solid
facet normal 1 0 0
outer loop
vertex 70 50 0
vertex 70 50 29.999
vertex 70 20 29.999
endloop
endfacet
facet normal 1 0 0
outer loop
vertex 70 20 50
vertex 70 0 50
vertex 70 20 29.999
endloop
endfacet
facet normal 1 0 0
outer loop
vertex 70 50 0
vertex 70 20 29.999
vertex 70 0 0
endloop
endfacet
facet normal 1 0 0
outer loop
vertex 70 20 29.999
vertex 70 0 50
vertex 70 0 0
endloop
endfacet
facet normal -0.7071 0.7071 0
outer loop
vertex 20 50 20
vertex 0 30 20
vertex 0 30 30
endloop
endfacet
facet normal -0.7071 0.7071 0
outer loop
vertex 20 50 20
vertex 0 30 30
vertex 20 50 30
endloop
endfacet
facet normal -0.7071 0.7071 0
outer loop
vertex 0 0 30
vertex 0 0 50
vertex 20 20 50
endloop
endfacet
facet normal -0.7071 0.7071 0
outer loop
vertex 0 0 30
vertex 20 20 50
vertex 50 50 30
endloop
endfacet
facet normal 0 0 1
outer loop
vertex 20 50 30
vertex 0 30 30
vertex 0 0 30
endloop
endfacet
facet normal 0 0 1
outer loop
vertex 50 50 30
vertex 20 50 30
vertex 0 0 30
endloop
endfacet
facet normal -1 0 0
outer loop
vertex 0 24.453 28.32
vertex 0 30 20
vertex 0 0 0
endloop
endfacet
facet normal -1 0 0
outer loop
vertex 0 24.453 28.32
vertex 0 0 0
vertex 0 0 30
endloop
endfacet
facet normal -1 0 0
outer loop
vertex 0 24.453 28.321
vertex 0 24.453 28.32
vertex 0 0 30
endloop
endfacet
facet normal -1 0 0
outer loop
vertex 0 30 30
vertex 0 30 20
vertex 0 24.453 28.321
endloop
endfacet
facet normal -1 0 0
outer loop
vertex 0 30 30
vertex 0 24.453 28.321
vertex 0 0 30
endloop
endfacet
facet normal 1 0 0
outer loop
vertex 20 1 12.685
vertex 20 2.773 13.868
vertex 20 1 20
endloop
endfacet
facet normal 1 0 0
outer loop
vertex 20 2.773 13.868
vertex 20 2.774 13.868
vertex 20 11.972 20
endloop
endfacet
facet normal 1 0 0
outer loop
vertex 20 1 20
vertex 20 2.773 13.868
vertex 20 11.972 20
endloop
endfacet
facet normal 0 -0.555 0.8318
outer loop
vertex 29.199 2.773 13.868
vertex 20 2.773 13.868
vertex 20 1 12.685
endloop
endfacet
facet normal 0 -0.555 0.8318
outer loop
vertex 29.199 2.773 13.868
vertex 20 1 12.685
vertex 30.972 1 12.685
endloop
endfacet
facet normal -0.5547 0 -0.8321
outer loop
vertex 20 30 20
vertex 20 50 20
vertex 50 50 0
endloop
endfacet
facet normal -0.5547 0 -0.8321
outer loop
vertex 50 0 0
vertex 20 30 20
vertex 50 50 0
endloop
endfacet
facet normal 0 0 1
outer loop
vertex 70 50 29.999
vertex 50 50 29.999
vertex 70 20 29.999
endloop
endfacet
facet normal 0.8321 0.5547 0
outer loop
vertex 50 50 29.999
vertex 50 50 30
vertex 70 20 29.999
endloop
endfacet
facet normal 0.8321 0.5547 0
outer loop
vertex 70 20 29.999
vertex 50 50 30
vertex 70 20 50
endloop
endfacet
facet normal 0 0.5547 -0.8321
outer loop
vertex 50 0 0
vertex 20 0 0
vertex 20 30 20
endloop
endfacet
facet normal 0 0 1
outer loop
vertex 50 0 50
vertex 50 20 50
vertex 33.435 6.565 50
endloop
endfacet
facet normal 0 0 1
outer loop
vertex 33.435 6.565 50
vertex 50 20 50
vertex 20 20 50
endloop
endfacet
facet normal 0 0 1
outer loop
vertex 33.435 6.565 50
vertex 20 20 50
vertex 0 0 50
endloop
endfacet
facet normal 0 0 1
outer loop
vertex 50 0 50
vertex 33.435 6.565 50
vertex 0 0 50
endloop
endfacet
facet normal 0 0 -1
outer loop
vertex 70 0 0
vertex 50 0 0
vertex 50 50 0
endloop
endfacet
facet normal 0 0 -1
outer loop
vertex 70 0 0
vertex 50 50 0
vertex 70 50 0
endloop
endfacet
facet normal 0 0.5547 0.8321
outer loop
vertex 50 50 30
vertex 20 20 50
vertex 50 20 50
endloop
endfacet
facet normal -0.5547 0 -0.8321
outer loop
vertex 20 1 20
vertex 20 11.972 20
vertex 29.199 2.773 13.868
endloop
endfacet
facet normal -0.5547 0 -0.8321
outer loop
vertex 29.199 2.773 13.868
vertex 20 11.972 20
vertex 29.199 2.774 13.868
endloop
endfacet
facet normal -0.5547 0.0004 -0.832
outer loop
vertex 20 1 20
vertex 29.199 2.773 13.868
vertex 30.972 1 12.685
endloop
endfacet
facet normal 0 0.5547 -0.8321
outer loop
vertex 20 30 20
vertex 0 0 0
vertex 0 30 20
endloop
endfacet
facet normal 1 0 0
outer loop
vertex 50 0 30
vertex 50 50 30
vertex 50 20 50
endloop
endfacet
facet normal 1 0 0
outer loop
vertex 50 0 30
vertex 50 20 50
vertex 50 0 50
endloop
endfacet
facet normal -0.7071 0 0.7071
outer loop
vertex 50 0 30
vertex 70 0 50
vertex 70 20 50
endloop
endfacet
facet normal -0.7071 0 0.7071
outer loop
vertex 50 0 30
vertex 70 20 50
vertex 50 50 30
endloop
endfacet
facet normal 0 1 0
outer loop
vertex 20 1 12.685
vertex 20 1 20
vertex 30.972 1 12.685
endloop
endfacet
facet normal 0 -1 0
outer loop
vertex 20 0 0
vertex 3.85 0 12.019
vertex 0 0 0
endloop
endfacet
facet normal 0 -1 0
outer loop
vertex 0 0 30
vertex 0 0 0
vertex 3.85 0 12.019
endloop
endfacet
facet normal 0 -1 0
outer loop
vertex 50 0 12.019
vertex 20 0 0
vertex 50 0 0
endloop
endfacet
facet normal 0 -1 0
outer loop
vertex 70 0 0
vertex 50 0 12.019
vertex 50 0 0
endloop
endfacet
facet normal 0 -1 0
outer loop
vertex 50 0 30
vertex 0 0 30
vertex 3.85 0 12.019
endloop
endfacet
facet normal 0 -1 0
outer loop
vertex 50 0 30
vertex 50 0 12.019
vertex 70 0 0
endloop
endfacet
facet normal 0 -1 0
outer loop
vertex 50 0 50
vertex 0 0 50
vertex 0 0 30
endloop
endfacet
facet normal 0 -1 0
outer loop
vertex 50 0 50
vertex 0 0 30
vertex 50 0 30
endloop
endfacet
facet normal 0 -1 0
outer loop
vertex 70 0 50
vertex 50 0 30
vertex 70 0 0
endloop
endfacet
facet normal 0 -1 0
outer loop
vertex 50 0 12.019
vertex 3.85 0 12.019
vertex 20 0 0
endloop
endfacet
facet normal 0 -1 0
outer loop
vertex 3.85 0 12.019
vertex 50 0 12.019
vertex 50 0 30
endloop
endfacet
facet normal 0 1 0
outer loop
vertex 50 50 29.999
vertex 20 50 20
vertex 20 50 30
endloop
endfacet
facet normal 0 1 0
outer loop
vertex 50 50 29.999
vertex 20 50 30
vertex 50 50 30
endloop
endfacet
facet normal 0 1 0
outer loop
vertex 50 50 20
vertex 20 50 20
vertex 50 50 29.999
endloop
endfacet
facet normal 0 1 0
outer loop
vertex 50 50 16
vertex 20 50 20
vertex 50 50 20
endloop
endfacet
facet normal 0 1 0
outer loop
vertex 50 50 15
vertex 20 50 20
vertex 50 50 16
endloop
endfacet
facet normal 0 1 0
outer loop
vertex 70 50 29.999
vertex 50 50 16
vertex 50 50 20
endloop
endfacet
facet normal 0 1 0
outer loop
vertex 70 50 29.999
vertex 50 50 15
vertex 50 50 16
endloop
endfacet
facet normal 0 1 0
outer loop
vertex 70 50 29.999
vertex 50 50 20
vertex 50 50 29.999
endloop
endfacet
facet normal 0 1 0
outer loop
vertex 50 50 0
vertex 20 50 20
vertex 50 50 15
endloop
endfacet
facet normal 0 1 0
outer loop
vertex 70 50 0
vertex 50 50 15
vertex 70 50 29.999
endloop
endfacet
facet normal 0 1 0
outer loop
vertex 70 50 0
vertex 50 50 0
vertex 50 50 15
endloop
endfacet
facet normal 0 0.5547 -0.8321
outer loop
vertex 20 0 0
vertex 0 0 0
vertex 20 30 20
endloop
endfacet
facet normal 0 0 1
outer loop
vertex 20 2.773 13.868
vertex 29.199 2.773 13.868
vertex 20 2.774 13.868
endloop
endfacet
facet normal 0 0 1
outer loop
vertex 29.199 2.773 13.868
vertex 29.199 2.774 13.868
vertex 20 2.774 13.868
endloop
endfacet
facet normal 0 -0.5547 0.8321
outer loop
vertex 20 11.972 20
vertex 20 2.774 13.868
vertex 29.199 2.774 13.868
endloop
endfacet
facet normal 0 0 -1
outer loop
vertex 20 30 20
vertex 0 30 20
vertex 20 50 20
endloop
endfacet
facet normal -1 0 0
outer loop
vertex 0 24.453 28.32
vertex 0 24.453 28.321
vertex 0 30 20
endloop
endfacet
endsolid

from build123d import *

# Parameters (mm, degrees)
BOSS_EXTRUDE1_DEPTH  = 50
CUT_EXTRUDE2_DEPTH   = 10
CUT_EXTRUDE3_DEPTH   = 20
SKETCH4_W            = 20
SKETCH4_H            = 50
CUT_EXTRUDE4_DEPTH   = 10
CUT_EXTRUDE5_DEPTH   = 10
CUT_EXTRUDE6_DEPTH   = 20
SKETCH7_W            = 10
SKETCH7_H            = 20
CUT_EXTRUDE7_DEPTH   = 30
BOSS_EXTRUDE2_DEPTH  = 30
CUT_EXTRUDE10_DEPTH  = 72
CUT_EXTRUDE13_DEPTH  = 10
BOSS_EXTRUDE3_DEPTH  = 10
BOSS_EXTRUDE4_DEPTH  = 29
BOSS_EXTRUDE5_DEPTH  = 29
CUT_EXTRUDE15_DEPTH  = 29
CUT_EXTRUDE17_DEPTH  = 10
BOSS_EXTRUDE6_DEPTH  = 35
CUT_EXTRUDE21_DEPTH  = 10
CUT_EXTRUDE23_DEPTH  = 10
CUT_EXTRUDE24_DEPTH  = 10
CUT_EXTRUDE25_DEPTH  = 10
BOSS_EXTRUDE13_DEPTH = 19
BOSS_EXTRUDE14_DEPTH = 19
BOSS_EXTRUDE15_DEPTH = 19
CUT_EXTRUDE27_DEPTH  = 19
CUT_EXTRUDE28_DEPTH  = 10
BOSS_EXTRUDE16_DEPTH = 35
BOSS_EXTRUDE17_DEPTH = 29
CUT_EXTRUDE29_DEPTH  = 108
BOSS_EXTRUDE18_DEPTH = 30
CUT_EXTRUDE30_DEPTH  = 10
CUT_EXTRUDE31_DEPTH  = 20
CUT_EXTRUDE34_DEPTH  = 10
CUT_EXTRUDE35_DEPTH  = 10
SKETCH51_W           = 10
SKETCH51_H           = 20
BOSS_EXTRUDE20_DEPTH = 10
BOSS_EXTRUDE21_DEPTH = 10
BOSS_EXTRUDE23_DEPTH = 50
CUT_EXTRUDE36_DEPTH  = 50
SKETCH55_W           = 20
SKETCH55_H           = 9.999
CUT_EXTRUDE41_DEPTH  = 50
SKETCH57_W           = 20
SKETCH57_H           = 9.999
BOSS_EXTRUDE24_DEPTH = 30
CUT_EXTRUDE45_DEPTH  = 10
CUT_EXTRUDE46_DEPTH  = 40
BOSS_EXTRUDE25_DEPTH = 0.0001
BOSS_EXTRUDE28_DEPTH = 10
EXTRUDE_THIN1_DEPTH  = 10
BOSS_EXTRUDE30_DEPTH = 10
CUT_EXTRUDE48_DEPTH  = 10
CUT_EXTRUDE50_DEPTH  = 10
SKETCH68_W           = 25.723933528
SKETCH68_H           = 25.413889584
BOSS_EXTRUDE39_DEPTH = 1


with BuildPart() as part:
    # Sketch1 → Boss-Extrude1 (new body)
    with BuildSketch(Plane.XY):
        Polygon((0, 0), (0, 30), (20, 50), (70, 50), (70, 0), align=None)
    extrude(amount=BOSS_EXTRUDE1_DEPTH)

    # Sketch2 → Cut-Extrude2 (cut)
    with BuildSketch(Plane.XY.offset(50)):
        Polygon((0, 30), (0, 0), (50, 50), (20, 50), align=None)
    extrude(amount=-CUT_EXTRUDE2_DEPTH, mode=Mode.SUBTRACT)

    # Sketch3 → Cut-Extrude3 (cut)
    with BuildSketch(Plane.XY.offset(50)):
        Polygon((50, 20), (20, 20), (0, 0), (50, 0), align=None)
    extrude(amount=-CUT_EXTRUDE3_DEPTH, mode=Mode.SUBTRACT)

    # Sketch4 → Cut-Extrude4 (cut)
    with BuildSketch(Plane.XY.offset(50)):
        with Locations((60, 25)):
            Rectangle(SKETCH4_W, SKETCH4_H)
    extrude(amount=-CUT_EXTRUDE4_DEPTH, mode=Mode.SUBTRACT)

    # Sketch5 → Cut-Extrude5 (cut)
    with BuildSketch(Plane.XY.offset(40)):
        Polygon((50, 50), (70, 20), (70, 50), align=None)
    extrude(amount=-CUT_EXTRUDE5_DEPTH, mode=Mode.SUBTRACT)

    # Sketch6 → Cut-Extrude6 (cut)
    with BuildSketch(Plane.ZY):
        Polygon((0, 0), (20, 30), (20, 50), (0, 50), align=None)
    extrude(amount=-CUT_EXTRUDE6_DEPTH, mode=Mode.SUBTRACT)

    # Sketch7 → Cut-Extrude7 (cut)
    with BuildSketch(Plane.ZY):
        with Locations((25, 40)):
            Rectangle(SKETCH7_W, SKETCH7_H)
    extrude(amount=-CUT_EXTRUDE7_DEPTH, mode=Mode.SUBTRACT)

    # Sketch8 → Boss-Extrude2 (add)
    with BuildSketch(Plane.ZY):
        Polygon((30, 50), (30, 0), (50, 0), (50, 20), align=None)
    extrude(amount=-BOSS_EXTRUDE2_DEPTH)

    # Sketch10 → Cut-Extrude10 (cut)
    with BuildSketch(Plane.ZY):
        Polygon((30, 50), (50, 20), (50, 50), align=None)
    extrude(amount=-CUT_EXTRUDE10_DEPTH, mode=Mode.SUBTRACT)

    # Sketch11 → Cut-Extrude13 (cut)
    with BuildSketch(Plane(origin=(0, 0, 0), x_dir=(0, 0, -1), z_dir=(1, 0, 0))):
        Polygon((-30, 50), (-30, 0), (-50, 0), (-50, 20), align=None)
    extrude(amount=CUT_EXTRUDE13_DEPTH, mode=Mode.SUBTRACT)

    # Sketch12 → Boss-Extrude3 (add)
    with BuildSketch(Plane(origin=(0, 29.230769231, 43.846153846), x_dir=(1, 0, 0), z_dir=(0, 0.5547001962252294, 0.8320502943378435))):
        Polygon((30, 6.933752453), (35, 6.933752453), (30, 0.924500327), align=None)
    extrude(amount=-BOSS_EXTRUDE3_DEPTH)

    # Sketch14 → Boss-Extrude4 (add)
    with BuildSketch(Plane.XY.offset(50)):
        Polygon((50, 0), (70, 0), (70, 20), (50, 50), align=None)
    extrude(amount=-BOSS_EXTRUDE4_DEPTH)

    # Sketch15 → Boss-Extrude5 (add)
    with BuildSketch(Plane.XY.offset(50)):
        Polygon((50, 0), (0, 0), (20, 20), (50, 20), align=None)
    extrude(amount=-BOSS_EXTRUDE5_DEPTH)

    # Sketch16 → Cut-Extrude15 (cut)
    with BuildSketch(Plane.XY.offset(50)):
        Polygon((10, 10), (20, 20), (10, 20), align=None)
    extrude(amount=-CUT_EXTRUDE15_DEPTH, mode=Mode.SUBTRACT)

    # Sketch17 → Cut-Extrude17 (cut)
    with BuildSketch(Plane.XY.offset(50)):
        Polygon((50, 20), (50, 0), (70, 0), (70, 20), (50, 50), align=None)
    extrude(amount=-CUT_EXTRUDE17_DEPTH, mode=Mode.SUBTRACT)

    # Sketch18 → Boss-Extrude6 (add)
    with BuildSketch(Plane.XY.offset(50)):
        Polygon((50, 20), (50, 50), (20, 20), align=None)
    extrude(amount=-BOSS_EXTRUDE6_DEPTH)

    # Sketch20 → Cut-Extrude21 (cut)
    with BuildSketch(Plane(origin=(0, 29.230769231, 43.846153846), x_dir=(1, 0, 0), z_dir=(0, 0.5547001962252294, 0.8320502943378435))):
        Polygon((20, -11.094003925), (50, 24.96150883), (10, 24.96150883), (10, -11.094003925), align=None)
    extrude(amount=-CUT_EXTRUDE21_DEPTH, mode=Mode.SUBTRACT)

    # Sketch26 → Cut-Extrude23 (cut)
    with BuildSketch(Plane.XY.offset(50)):
        Polygon((50, 50), (50, 20), (20, 20), align=None)
    extrude(amount=-CUT_EXTRUDE23_DEPTH, mode=Mode.SUBTRACT)

    # Sketch28 → Cut-Extrude24 (cut)
    with BuildSketch(Plane.XY.offset(40)):
        Polygon((50, 20), (50, 50), (24.615384615, 20), align=None)
    extrude(amount=-CUT_EXTRUDE24_DEPTH, mode=Mode.SUBTRACT)


with BuildPart() as cut_extrude24_piece_1:
    # of the separate pieces the step leaves, piece 1, a body of its own (cut_extrude24_pieces)
    add(part.part.solids().sort_by_distance((0, 0, 0))[0])

    # Sketch32 → Boss-Extrude13 (add)
    with BuildSketch(Plane.XY.offset(35)):
        Polygon((20, 20), (50, 20), (50, 50), align=None)
    extrude(amount=-BOSS_EXTRUDE13_DEPTH)

    # Sketch33 → Boss-Extrude14 (add)
    with BuildSketch(Plane(origin=(0, 0, 0), x_dir=(0, 0, 1), z_dir=(-0.7071067811865476, 0.7071067811865475, 0))):
        Polygon((41.679497057, 20.439625842), (37.981495748, 28.284271247), (50, 28.284271247), align=None)
    extrude(amount=-BOSS_EXTRUDE14_DEPTH)

    # Sketch34 → Boss-Extrude15 (add)
    with BuildSketch(Plane(origin=(0, 20, 0), x_dir=(1, 0, 0), z_dir=(0, 1, 0))):
        Polygon((25.547001962, -37.981495748), (20, -37.981495748), (20, -50), align=None)
    extrude(amount=-BOSS_EXTRUDE15_DEPTH)

    # Sketch36 → Cut-Extrude27 (cut)
    with BuildSketch(Plane.XY.offset(35)):
        Polygon((28.399590758, 24.472243623), (24.615384615, 20), (8.952966546, 20), (8.952966546, 24.472243623), align=None)
    extrude(amount=CUT_EXTRUDE27_DEPTH, mode=Mode.SUBTRACT)

    # Sketch37 → Cut-Extrude28 (cut)
    with BuildSketch(Plane.XY.offset(35)):
        Polygon((24.472243623, 24.472243623), (20, 20), (10, 20), (10, 24.472243623), align=None)
    extrude(amount=-CUT_EXTRUDE28_DEPTH, mode=Mode.SUBTRACT)

    # Sketch39 → Boss-Extrude16 (add)
    with BuildSketch(Plane.ZY.offset(-30)):
        Polygon((30, 31.972243623), (30, 50), (21.679497057, 44.452998038), align=None)
    extrude(amount=-BOSS_EXTRUDE16_DEPTH)

    # Sketch41 → Boss-Extrude17 (add)
    with BuildSketch(Plane(origin=(20, 0, 0), x_dir=(0, 0, -1), z_dir=(1, 0, 0))):
        Polygon((-30, 0), (-50, 0), (-50, 20), (-30, 50), align=None)
    extrude(amount=BOSS_EXTRUDE17_DEPTH)

    # Sketch42 → Cut-Extrude29 (cut)
    with BuildSketch(Plane.ZY):
        Polygon((50, 50), (50, 20), (30, 50), align=None)
    extrude(amount=-CUT_EXTRUDE29_DEPTH, mode=Mode.SUBTRACT)

    # Sketch43 → Boss-Extrude18 (add)
    with BuildSketch(Plane.ZY.offset(-20)):
        Polygon((30, 50), (30, 20), (50, 20), align=None)
    extrude(amount=-BOSS_EXTRUDE18_DEPTH)

    # Sketch44 → Cut-Extrude30 (cut)
    with BuildSketch(Plane.ZY.offset(-10)):
        Polygon((30, 24.472243623), (30, 31.972243623), (35, 24.472243623), align=None)
    extrude(amount=-CUT_EXTRUDE30_DEPTH, mode=Mode.SUBTRACT)

    # Sketch45 → Cut-Extrude31 (cut)
    with BuildSketch(Plane.XY.offset(50)):
        Polygon((20, 20), (50, 50), (20, 50), align=None)
    extrude(amount=-CUT_EXTRUDE31_DEPTH, mode=Mode.SUBTRACT)

    # Sketch48 → Cut-Extrude34 (cut)
    with BuildSketch(Plane.XY.offset(40)):
        Polygon((70, 0), (70, 20), (60, 35), (50, 35), (50, 0), align=None)
        Polygon((50, 50), (50, 35), (60, 35), align=None)
    extrude(amount=-CUT_EXTRUDE34_DEPTH, mode=Mode.SUBTRACT)

    # Sketch49 → Cut-Extrude35 (cut)
    with BuildSketch(Plane.XY.offset(30)):
        Polygon((50, 50), (70, 20), (70, 50), align=None)
    extrude(amount=-CUT_EXTRUDE35_DEPTH, mode=Mode.SUBTRACT)

    # Sketch51 → Boss-Extrude20 (add)
    with BuildSketch(Plane.XY.offset(20)):
        with Locations((25, 40)):
            Rectangle(SKETCH51_W, SKETCH51_H)
        Polygon((20, 30), (0, 30), (20, 50), align=None)
    extrude(amount=BOSS_EXTRUDE20_DEPTH)

    # Sketch52 → Boss-Extrude21 (add)
    with BuildSketch(Plane.XY.offset(30)):
        Polygon((10, 10), (24.472243623, 24.472243623), (10, 24.472243623), align=None)
    extrude(amount=-BOSS_EXTRUDE21_DEPTH)

    # Sketch53 → Boss-Extrude23 (add)
    with BuildSketch(Plane(origin=(0, 0, 0), x_dir=(1, 0, 0), z_dir=(0, 1, 0))):
        Polygon((70, -30), (70, -50), (50, -30), align=None)
    extrude(amount=BOSS_EXTRUDE23_DEPTH)

    # Sketch54 → Cut-Extrude36 (cut)
    with BuildSketch(Plane(origin=(0, 0, 30), x_dir=(-1, 0, 0), z_dir=(0, 0, -1))):
        Polygon((-70, 20), (-50, 50), (-70, 50), align=None)
    extrude(amount=-CUT_EXTRUDE36_DEPTH, mode=Mode.SUBTRACT)

    # Sketch55 → Cut-Extrude41 (cut)
    with BuildSketch(Plane(origin=(0, 20, 0), x_dir=(1, 0, 0), z_dir=(0, 1, 0))):
        with Locations((60, -24.9995)):
            Rectangle(SKETCH55_W, SKETCH55_H)
    extrude(amount=CUT_EXTRUDE41_DEPTH, mode=Mode.SUBTRACT)

    # Sketch57 → Boss-Extrude24 (add)
    with BuildSketch(Plane(origin=(0, 20, 0), x_dir=(1, 0, 0), z_dir=(0, 1, 0))):
        with Locations((60, -24.9995)):
            Rectangle(SKETCH57_W, SKETCH57_H)
    extrude(amount=BOSS_EXTRUDE24_DEPTH)

    # Sketch58 → Cut-Extrude45 (cut)
    with BuildSketch(Plane(origin=(0, 50, 0), x_dir=(1, 0, 0), z_dir=(0, 1, 0))):
        Polygon((20, -20), (50, 0), (20, 0), align=None)
    extrude(amount=-CUT_EXTRUDE45_DEPTH, mode=Mode.SUBTRACT)

    # Sketch59 → Cut-Extrude46 (cut)
    with BuildSketch(Plane(origin=(0, 40, 0), x_dir=(1, 0, 0), z_dir=(0, 1, 0))):
        Polygon((20, 0), (20, -20), (50, 0), align=None)
    extrude(amount=-CUT_EXTRUDE46_DEPTH, mode=Mode.SUBTRACT)

    # Sketch60 → Boss-Extrude25 (add)
    with BuildSketch(Plane.XZ):
        Polygon((20, 0), (50, 0), (20, 20), align=None)
    extrude(amount=-BOSS_EXTRUDE25_DEPTH)

    # Sketch61 → Boss-Extrude28 (add)
    with BuildSketch(Plane(origin=(0, 3.0769e-05, -4.6154e-05), x_dir=(1, 0, 0), z_dir=(0, -0.5547014763049025, 0.8320494409499725))):
        Polygon((50, 8.3205e-05), (20, 36.055512755), (20, 8.3205e-05), align=None)
    extrude(amount=BOSS_EXTRUDE28_DEPTH)

    # Sketch62 → Extrude-Thin1 (add)
    with BuildSketch(Plane(origin=(0, 0, 0), x_dir=(-0.9999999999968847, 1.384610769127148e-06, -2.0769161536907223e-06), z_dir=(2.496142562323782e-06, 0.5547001962235016, -0.8320502943352512))):
        Polygon((0, 36.055512755), (-4.722952829, 0), (-50, 8.3205e-05), (-49.999981623, 10.000083205), (-13.498467783, 10.000016127), (-9.915295125, 37.354328597), align=None)
    extrude(amount=-EXTRUDE_THIN1_DEPTH)

    # Sketch63 → Boss-Extrude30 (add)
    with BuildSketch(Plane(origin=(0, 0, 0), x_dir=(-0.9999999999993847, -6.153857514652135e-07, 9.230773964263176e-07), z_dir=(-1.109401416485302e-06, 0.5547007082562057, -0.8320499529828923))):
        Polygon((-20, 36.055512755), (0, 0), (-50, 8.3205e-05), align=None)
    extrude(amount=-BOSS_EXTRUDE30_DEPTH)


with BuildPart() as cut_extrude24_piece_2:
    # of the separate pieces the step leaves, piece 2, a body of its own (cut_extrude24_pieces)
    add(part.part.solids().sort_by_distance((35, 35, 40))[0])

    # Sketch30 → Cut-Extrude25 (cut)
    with BuildSketch(Plane(origin=(4.482758621, -3.793103448, 0), x_dir=(0, 0, 1), z_dir=(-0.7633862853691147, 0.6459422414661738, 0))):
        Polygon((30, 70.466426342), (40, 70.466426342), (40, 31.16784242), align=None)
    extrude(amount=CUT_EXTRUDE25_DEPTH, mode=Mode.SUBTRACT)


with BuildPart() as boss_extrude30_kept_piece:
    # of the separate pieces the step leaves, the one the design keeps (boss_extrude30_pieces_kept)
    add(cut_extrude24_piece_1.part.solids().sort_by_distance((0, 0, 0))[0])

    # Sketch64 → Cut-Extrude48 (cut)
    with BuildSketch(Plane(origin=(0, 0, 0), x_dir=(-1, 0, 0), z_dir=(0, -1, 0))):
        Polygon((-49.999962787, -12.018654251), (-50.000000002, -0.000150001), (0, 0), (-3.698015816, -12.018504252), align=None)
    extrude(amount=CUT_EXTRUDE48_DEPTH, mode=Mode.SUBTRACT)


with BuildPart() as cut_extrude48_piece_1:
    # of the separate pieces the step leaves, piece 1, a body of its own (cut_extrude48_pieces_kept)
    add(boss_extrude30_kept_piece.part.solids().sort_by_distance((0, 30, 20))[0])

    # Sketch68 → Boss-Extrude39 (add)
    with BuildSketch(Plane.XZ):
        with Locations((25.237412158, 15.000389629)):
            Rectangle(SKETCH68_W, SKETCH68_H)
    extrude(amount=-BOSS_EXTRUDE39_DEPTH)


with BuildPart() as cut_extrude48_piece_2:
    # of the separate pieces the step leaves, piece 2, a body of its own (cut_extrude48_pieces_kept)
    add(boss_extrude30_kept_piece.part.solids().sort_by_distance((1.1094e-05, -5.547007083, 8.32049953))[0])

    # Sketch67 → Cut-Extrude50 (cut)
    with BuildSketch(Plane(origin=(0, 0, 0), x_dir=(0.2443048636302998, -0.11275589430574709, 0.9631205749572023), z_dir=(-0.8744746321945025, 0.4036029726775825, 0.2690701731781287))):
        Polygon((8.639104746, -5.03645403), (0, 0), (12.478711974, 1.54968154), align=None)
    extrude(amount=-CUT_EXTRUDE50_DEPTH, mode=Mode.SUBTRACT)


solid = cut_extrude48_piece_1.part
